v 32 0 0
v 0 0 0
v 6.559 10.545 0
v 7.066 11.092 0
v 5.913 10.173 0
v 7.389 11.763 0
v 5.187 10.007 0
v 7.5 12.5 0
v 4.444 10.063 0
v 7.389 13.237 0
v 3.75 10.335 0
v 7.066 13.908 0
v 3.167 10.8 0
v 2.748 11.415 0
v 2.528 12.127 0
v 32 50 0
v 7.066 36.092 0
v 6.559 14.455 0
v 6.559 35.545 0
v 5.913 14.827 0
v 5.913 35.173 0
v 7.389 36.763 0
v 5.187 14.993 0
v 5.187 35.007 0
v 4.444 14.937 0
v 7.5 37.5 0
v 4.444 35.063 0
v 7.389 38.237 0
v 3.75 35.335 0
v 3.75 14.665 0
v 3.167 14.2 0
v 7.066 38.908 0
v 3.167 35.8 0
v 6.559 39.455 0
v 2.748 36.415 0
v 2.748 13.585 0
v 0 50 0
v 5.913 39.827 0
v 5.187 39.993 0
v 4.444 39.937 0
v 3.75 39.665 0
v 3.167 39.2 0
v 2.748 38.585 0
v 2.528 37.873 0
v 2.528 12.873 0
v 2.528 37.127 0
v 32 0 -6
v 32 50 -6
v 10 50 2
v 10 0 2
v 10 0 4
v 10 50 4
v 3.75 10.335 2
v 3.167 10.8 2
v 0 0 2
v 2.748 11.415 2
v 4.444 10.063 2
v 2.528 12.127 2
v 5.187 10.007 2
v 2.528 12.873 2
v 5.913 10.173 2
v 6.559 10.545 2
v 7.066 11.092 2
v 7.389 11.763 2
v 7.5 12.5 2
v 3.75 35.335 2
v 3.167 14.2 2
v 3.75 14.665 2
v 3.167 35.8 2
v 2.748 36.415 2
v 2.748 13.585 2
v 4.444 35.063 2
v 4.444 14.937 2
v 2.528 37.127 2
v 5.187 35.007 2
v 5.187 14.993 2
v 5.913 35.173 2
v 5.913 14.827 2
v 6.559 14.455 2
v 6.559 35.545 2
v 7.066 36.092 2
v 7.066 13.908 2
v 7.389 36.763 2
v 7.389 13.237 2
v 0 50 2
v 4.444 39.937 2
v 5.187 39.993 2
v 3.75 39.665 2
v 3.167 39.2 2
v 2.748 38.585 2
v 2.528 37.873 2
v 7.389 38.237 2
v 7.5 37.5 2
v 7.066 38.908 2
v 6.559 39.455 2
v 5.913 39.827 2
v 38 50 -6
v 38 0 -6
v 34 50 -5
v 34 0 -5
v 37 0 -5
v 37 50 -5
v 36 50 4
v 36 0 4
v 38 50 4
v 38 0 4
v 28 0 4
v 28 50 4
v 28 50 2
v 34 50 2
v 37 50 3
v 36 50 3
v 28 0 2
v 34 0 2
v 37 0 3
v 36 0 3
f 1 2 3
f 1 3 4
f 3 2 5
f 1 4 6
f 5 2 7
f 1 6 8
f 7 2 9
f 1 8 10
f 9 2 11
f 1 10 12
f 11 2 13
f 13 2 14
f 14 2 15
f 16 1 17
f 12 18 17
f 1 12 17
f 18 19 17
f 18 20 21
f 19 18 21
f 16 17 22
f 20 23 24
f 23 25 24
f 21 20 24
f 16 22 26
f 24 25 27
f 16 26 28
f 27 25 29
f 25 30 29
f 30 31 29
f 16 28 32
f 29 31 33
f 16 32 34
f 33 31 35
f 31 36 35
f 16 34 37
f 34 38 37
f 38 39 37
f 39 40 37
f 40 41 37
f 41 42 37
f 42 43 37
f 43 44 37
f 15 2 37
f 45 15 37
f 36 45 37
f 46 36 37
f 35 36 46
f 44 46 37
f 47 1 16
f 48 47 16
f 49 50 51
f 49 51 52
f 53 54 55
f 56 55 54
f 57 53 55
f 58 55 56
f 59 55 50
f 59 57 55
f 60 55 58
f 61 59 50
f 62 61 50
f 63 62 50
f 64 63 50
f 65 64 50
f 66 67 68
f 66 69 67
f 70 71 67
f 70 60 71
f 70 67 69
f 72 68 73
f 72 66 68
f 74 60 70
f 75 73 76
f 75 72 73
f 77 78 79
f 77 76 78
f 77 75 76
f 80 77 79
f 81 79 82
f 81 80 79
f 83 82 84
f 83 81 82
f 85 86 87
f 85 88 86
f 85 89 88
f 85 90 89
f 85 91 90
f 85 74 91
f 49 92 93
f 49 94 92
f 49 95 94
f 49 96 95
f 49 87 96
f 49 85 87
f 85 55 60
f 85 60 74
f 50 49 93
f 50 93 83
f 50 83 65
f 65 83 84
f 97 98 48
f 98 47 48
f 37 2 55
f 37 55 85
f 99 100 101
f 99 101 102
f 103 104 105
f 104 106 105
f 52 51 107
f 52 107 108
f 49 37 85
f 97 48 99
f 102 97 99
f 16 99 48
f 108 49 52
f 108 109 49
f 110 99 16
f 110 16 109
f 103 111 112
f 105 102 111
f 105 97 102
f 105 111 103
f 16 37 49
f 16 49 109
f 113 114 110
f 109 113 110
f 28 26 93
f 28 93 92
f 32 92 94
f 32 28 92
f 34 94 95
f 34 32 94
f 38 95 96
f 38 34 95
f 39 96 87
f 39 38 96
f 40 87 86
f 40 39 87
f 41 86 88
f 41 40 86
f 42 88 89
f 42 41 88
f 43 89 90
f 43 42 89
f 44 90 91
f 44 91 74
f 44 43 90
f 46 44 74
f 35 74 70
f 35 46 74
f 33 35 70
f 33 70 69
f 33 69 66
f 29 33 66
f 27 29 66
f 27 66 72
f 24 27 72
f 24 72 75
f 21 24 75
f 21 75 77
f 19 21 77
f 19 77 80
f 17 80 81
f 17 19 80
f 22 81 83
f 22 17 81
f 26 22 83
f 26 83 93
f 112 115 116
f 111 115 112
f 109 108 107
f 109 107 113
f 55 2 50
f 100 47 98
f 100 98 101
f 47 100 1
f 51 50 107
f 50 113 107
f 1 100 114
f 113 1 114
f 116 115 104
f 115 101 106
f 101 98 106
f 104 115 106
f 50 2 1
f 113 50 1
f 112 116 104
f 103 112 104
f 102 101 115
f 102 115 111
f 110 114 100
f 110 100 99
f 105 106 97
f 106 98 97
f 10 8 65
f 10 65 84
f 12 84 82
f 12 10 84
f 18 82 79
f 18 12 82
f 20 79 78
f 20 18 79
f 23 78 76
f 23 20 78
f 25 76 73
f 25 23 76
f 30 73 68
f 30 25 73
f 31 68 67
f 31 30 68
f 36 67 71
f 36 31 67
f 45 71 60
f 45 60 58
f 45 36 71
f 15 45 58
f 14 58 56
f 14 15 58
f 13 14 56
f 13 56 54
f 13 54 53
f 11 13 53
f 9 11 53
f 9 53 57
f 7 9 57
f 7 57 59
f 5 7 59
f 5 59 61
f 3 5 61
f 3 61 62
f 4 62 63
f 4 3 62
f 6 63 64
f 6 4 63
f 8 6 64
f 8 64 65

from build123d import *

# Parameters (mm, degrees)
ESQUISSE1_W             = 10
ESQUISSE1_H             = 50
ESQUISSE1_R             = 2.5
ESQUISSE1_W_2           = 2
BOSS_EXTRU_1_DEPTH      = 2
ESQUISSE2_W             = 2
ESQUISSE2_H             = 50
BOSS_EXTRU_2_DEPTH      = 2
ESQUISSE3_W             = 4
ESQUISSE3_H             = 50
BOSS_EXTRU_3_DEPTH      = 22
ESQUISSE4_W             = 2
ESQUISSE4_H             = 50
BOSS_EXTRU_4_DEPTH      = 6
ESQUISSE5_W             = 2
ESQUISSE5_H             = 50
ENL_V_MAT_EXTRU_1_DEPTH = 6
ESQUISSE6_W             = 1
ESQUISSE6_H             = 50
BOSS_EXTRU_5_DEPTH      = 4
ESQUISSE7_W             = 1
ESQUISSE7_H             = 50
BOSS_EXTRU_6_DEPTH      = 9
ESQUISSE8_W             = 1
ESQUISSE8_H             = 50
BOSS_EXTRU_7_DEPTH      = 1


with BuildPart() as part:
    # Esquisse1 → Boss.-Extru.1 (new body)
    with BuildSketch(Plane.XY):
        with Locations((5, 25)):
            Rectangle(ESQUISSE1_W, ESQUISSE1_H)
        with Locations((5, 12.5)):
            Circle(ESQUISSE1_R, mode=Mode.SUBTRACT)
        with Locations((5, 37.5)):
            Circle(ESQUISSE1_R, mode=Mode.SUBTRACT)
        with Locations((11, 25)):
            Rectangle(ESQUISSE1_W_2, ESQUISSE1_H)
    extrude(amount=BOSS_EXTRU_1_DEPTH)

    # Esquisse2 → Boss.-Extru.2 (add)
    with BuildSketch(Plane.XY.offset(2)):
        with Locations((11, 25)):
            Rectangle(ESQUISSE2_W, ESQUISSE2_H)
    extrude(amount=BOSS_EXTRU_2_DEPTH)

    # Esquisse3 → Boss.-Extru.3 (add)
    with BuildSketch(Plane(origin=(12, 0, 0), x_dir=(0, 0, -1), z_dir=(1, 0, 0))):
        with Locations((-2, 25)):
            Rectangle(ESQUISSE3_W, ESQUISSE3_H)
    extrude(amount=BOSS_EXTRU_3_DEPTH)

    # Esquisse4 → Boss.-Extru.4 (add)
    with BuildSketch(Plane(origin=(0, 0, 0), x_dir=(-1, 0, 0), z_dir=(0, 0, -1))):
        with Locations((-33, 25)):
            Rectangle(ESQUISSE4_W, ESQUISSE4_H)
    extrude(amount=BOSS_EXTRU_4_DEPTH)

    # Esquisse5 → Enlèv. mat.-Extru.1 (cut)
    with BuildSketch(Plane(origin=(34, 0, 0), x_dir=(0, 0, -1), z_dir=(1, 0, 0))):
        with Locations((-3, 25)):
            Rectangle(ESQUISSE5_W, ESQUISSE5_H)
    extrude(amount=-ENL_V_MAT_EXTRU_1_DEPTH, mode=Mode.SUBTRACT)

    # Esquisse6 → Boss.-Extru.5 (add)
    with BuildSketch(Plane(origin=(34, 0, 0), x_dir=(0, 0, -1), z_dir=(1, 0, 0))):
        with Locations((5.5, 25)):
            Rectangle(ESQUISSE6_W, ESQUISSE6_H)
    extrude(amount=BOSS_EXTRU_5_DEPTH)

    # Esquisse7 → Boss.-Extru.6 (add)
    with BuildSketch(Plane.XY.offset(-5)):
        with Locations((37.5, 25)):
            Rectangle(ESQUISSE7_W, ESQUISSE7_H)
    extrude(amount=BOSS_EXTRU_6_DEPTH)

    # Esquisse8 → Boss.-Extru.7 (add)
    with BuildSketch(Plane.ZY.offset(-37)):
        with Locations((3.5, 25)):
            Rectangle(ESQUISSE8_W, ESQUISSE8_H)
    extrude(amount=BOSS_EXTRU_7_DEPTH)


solid = part.part
